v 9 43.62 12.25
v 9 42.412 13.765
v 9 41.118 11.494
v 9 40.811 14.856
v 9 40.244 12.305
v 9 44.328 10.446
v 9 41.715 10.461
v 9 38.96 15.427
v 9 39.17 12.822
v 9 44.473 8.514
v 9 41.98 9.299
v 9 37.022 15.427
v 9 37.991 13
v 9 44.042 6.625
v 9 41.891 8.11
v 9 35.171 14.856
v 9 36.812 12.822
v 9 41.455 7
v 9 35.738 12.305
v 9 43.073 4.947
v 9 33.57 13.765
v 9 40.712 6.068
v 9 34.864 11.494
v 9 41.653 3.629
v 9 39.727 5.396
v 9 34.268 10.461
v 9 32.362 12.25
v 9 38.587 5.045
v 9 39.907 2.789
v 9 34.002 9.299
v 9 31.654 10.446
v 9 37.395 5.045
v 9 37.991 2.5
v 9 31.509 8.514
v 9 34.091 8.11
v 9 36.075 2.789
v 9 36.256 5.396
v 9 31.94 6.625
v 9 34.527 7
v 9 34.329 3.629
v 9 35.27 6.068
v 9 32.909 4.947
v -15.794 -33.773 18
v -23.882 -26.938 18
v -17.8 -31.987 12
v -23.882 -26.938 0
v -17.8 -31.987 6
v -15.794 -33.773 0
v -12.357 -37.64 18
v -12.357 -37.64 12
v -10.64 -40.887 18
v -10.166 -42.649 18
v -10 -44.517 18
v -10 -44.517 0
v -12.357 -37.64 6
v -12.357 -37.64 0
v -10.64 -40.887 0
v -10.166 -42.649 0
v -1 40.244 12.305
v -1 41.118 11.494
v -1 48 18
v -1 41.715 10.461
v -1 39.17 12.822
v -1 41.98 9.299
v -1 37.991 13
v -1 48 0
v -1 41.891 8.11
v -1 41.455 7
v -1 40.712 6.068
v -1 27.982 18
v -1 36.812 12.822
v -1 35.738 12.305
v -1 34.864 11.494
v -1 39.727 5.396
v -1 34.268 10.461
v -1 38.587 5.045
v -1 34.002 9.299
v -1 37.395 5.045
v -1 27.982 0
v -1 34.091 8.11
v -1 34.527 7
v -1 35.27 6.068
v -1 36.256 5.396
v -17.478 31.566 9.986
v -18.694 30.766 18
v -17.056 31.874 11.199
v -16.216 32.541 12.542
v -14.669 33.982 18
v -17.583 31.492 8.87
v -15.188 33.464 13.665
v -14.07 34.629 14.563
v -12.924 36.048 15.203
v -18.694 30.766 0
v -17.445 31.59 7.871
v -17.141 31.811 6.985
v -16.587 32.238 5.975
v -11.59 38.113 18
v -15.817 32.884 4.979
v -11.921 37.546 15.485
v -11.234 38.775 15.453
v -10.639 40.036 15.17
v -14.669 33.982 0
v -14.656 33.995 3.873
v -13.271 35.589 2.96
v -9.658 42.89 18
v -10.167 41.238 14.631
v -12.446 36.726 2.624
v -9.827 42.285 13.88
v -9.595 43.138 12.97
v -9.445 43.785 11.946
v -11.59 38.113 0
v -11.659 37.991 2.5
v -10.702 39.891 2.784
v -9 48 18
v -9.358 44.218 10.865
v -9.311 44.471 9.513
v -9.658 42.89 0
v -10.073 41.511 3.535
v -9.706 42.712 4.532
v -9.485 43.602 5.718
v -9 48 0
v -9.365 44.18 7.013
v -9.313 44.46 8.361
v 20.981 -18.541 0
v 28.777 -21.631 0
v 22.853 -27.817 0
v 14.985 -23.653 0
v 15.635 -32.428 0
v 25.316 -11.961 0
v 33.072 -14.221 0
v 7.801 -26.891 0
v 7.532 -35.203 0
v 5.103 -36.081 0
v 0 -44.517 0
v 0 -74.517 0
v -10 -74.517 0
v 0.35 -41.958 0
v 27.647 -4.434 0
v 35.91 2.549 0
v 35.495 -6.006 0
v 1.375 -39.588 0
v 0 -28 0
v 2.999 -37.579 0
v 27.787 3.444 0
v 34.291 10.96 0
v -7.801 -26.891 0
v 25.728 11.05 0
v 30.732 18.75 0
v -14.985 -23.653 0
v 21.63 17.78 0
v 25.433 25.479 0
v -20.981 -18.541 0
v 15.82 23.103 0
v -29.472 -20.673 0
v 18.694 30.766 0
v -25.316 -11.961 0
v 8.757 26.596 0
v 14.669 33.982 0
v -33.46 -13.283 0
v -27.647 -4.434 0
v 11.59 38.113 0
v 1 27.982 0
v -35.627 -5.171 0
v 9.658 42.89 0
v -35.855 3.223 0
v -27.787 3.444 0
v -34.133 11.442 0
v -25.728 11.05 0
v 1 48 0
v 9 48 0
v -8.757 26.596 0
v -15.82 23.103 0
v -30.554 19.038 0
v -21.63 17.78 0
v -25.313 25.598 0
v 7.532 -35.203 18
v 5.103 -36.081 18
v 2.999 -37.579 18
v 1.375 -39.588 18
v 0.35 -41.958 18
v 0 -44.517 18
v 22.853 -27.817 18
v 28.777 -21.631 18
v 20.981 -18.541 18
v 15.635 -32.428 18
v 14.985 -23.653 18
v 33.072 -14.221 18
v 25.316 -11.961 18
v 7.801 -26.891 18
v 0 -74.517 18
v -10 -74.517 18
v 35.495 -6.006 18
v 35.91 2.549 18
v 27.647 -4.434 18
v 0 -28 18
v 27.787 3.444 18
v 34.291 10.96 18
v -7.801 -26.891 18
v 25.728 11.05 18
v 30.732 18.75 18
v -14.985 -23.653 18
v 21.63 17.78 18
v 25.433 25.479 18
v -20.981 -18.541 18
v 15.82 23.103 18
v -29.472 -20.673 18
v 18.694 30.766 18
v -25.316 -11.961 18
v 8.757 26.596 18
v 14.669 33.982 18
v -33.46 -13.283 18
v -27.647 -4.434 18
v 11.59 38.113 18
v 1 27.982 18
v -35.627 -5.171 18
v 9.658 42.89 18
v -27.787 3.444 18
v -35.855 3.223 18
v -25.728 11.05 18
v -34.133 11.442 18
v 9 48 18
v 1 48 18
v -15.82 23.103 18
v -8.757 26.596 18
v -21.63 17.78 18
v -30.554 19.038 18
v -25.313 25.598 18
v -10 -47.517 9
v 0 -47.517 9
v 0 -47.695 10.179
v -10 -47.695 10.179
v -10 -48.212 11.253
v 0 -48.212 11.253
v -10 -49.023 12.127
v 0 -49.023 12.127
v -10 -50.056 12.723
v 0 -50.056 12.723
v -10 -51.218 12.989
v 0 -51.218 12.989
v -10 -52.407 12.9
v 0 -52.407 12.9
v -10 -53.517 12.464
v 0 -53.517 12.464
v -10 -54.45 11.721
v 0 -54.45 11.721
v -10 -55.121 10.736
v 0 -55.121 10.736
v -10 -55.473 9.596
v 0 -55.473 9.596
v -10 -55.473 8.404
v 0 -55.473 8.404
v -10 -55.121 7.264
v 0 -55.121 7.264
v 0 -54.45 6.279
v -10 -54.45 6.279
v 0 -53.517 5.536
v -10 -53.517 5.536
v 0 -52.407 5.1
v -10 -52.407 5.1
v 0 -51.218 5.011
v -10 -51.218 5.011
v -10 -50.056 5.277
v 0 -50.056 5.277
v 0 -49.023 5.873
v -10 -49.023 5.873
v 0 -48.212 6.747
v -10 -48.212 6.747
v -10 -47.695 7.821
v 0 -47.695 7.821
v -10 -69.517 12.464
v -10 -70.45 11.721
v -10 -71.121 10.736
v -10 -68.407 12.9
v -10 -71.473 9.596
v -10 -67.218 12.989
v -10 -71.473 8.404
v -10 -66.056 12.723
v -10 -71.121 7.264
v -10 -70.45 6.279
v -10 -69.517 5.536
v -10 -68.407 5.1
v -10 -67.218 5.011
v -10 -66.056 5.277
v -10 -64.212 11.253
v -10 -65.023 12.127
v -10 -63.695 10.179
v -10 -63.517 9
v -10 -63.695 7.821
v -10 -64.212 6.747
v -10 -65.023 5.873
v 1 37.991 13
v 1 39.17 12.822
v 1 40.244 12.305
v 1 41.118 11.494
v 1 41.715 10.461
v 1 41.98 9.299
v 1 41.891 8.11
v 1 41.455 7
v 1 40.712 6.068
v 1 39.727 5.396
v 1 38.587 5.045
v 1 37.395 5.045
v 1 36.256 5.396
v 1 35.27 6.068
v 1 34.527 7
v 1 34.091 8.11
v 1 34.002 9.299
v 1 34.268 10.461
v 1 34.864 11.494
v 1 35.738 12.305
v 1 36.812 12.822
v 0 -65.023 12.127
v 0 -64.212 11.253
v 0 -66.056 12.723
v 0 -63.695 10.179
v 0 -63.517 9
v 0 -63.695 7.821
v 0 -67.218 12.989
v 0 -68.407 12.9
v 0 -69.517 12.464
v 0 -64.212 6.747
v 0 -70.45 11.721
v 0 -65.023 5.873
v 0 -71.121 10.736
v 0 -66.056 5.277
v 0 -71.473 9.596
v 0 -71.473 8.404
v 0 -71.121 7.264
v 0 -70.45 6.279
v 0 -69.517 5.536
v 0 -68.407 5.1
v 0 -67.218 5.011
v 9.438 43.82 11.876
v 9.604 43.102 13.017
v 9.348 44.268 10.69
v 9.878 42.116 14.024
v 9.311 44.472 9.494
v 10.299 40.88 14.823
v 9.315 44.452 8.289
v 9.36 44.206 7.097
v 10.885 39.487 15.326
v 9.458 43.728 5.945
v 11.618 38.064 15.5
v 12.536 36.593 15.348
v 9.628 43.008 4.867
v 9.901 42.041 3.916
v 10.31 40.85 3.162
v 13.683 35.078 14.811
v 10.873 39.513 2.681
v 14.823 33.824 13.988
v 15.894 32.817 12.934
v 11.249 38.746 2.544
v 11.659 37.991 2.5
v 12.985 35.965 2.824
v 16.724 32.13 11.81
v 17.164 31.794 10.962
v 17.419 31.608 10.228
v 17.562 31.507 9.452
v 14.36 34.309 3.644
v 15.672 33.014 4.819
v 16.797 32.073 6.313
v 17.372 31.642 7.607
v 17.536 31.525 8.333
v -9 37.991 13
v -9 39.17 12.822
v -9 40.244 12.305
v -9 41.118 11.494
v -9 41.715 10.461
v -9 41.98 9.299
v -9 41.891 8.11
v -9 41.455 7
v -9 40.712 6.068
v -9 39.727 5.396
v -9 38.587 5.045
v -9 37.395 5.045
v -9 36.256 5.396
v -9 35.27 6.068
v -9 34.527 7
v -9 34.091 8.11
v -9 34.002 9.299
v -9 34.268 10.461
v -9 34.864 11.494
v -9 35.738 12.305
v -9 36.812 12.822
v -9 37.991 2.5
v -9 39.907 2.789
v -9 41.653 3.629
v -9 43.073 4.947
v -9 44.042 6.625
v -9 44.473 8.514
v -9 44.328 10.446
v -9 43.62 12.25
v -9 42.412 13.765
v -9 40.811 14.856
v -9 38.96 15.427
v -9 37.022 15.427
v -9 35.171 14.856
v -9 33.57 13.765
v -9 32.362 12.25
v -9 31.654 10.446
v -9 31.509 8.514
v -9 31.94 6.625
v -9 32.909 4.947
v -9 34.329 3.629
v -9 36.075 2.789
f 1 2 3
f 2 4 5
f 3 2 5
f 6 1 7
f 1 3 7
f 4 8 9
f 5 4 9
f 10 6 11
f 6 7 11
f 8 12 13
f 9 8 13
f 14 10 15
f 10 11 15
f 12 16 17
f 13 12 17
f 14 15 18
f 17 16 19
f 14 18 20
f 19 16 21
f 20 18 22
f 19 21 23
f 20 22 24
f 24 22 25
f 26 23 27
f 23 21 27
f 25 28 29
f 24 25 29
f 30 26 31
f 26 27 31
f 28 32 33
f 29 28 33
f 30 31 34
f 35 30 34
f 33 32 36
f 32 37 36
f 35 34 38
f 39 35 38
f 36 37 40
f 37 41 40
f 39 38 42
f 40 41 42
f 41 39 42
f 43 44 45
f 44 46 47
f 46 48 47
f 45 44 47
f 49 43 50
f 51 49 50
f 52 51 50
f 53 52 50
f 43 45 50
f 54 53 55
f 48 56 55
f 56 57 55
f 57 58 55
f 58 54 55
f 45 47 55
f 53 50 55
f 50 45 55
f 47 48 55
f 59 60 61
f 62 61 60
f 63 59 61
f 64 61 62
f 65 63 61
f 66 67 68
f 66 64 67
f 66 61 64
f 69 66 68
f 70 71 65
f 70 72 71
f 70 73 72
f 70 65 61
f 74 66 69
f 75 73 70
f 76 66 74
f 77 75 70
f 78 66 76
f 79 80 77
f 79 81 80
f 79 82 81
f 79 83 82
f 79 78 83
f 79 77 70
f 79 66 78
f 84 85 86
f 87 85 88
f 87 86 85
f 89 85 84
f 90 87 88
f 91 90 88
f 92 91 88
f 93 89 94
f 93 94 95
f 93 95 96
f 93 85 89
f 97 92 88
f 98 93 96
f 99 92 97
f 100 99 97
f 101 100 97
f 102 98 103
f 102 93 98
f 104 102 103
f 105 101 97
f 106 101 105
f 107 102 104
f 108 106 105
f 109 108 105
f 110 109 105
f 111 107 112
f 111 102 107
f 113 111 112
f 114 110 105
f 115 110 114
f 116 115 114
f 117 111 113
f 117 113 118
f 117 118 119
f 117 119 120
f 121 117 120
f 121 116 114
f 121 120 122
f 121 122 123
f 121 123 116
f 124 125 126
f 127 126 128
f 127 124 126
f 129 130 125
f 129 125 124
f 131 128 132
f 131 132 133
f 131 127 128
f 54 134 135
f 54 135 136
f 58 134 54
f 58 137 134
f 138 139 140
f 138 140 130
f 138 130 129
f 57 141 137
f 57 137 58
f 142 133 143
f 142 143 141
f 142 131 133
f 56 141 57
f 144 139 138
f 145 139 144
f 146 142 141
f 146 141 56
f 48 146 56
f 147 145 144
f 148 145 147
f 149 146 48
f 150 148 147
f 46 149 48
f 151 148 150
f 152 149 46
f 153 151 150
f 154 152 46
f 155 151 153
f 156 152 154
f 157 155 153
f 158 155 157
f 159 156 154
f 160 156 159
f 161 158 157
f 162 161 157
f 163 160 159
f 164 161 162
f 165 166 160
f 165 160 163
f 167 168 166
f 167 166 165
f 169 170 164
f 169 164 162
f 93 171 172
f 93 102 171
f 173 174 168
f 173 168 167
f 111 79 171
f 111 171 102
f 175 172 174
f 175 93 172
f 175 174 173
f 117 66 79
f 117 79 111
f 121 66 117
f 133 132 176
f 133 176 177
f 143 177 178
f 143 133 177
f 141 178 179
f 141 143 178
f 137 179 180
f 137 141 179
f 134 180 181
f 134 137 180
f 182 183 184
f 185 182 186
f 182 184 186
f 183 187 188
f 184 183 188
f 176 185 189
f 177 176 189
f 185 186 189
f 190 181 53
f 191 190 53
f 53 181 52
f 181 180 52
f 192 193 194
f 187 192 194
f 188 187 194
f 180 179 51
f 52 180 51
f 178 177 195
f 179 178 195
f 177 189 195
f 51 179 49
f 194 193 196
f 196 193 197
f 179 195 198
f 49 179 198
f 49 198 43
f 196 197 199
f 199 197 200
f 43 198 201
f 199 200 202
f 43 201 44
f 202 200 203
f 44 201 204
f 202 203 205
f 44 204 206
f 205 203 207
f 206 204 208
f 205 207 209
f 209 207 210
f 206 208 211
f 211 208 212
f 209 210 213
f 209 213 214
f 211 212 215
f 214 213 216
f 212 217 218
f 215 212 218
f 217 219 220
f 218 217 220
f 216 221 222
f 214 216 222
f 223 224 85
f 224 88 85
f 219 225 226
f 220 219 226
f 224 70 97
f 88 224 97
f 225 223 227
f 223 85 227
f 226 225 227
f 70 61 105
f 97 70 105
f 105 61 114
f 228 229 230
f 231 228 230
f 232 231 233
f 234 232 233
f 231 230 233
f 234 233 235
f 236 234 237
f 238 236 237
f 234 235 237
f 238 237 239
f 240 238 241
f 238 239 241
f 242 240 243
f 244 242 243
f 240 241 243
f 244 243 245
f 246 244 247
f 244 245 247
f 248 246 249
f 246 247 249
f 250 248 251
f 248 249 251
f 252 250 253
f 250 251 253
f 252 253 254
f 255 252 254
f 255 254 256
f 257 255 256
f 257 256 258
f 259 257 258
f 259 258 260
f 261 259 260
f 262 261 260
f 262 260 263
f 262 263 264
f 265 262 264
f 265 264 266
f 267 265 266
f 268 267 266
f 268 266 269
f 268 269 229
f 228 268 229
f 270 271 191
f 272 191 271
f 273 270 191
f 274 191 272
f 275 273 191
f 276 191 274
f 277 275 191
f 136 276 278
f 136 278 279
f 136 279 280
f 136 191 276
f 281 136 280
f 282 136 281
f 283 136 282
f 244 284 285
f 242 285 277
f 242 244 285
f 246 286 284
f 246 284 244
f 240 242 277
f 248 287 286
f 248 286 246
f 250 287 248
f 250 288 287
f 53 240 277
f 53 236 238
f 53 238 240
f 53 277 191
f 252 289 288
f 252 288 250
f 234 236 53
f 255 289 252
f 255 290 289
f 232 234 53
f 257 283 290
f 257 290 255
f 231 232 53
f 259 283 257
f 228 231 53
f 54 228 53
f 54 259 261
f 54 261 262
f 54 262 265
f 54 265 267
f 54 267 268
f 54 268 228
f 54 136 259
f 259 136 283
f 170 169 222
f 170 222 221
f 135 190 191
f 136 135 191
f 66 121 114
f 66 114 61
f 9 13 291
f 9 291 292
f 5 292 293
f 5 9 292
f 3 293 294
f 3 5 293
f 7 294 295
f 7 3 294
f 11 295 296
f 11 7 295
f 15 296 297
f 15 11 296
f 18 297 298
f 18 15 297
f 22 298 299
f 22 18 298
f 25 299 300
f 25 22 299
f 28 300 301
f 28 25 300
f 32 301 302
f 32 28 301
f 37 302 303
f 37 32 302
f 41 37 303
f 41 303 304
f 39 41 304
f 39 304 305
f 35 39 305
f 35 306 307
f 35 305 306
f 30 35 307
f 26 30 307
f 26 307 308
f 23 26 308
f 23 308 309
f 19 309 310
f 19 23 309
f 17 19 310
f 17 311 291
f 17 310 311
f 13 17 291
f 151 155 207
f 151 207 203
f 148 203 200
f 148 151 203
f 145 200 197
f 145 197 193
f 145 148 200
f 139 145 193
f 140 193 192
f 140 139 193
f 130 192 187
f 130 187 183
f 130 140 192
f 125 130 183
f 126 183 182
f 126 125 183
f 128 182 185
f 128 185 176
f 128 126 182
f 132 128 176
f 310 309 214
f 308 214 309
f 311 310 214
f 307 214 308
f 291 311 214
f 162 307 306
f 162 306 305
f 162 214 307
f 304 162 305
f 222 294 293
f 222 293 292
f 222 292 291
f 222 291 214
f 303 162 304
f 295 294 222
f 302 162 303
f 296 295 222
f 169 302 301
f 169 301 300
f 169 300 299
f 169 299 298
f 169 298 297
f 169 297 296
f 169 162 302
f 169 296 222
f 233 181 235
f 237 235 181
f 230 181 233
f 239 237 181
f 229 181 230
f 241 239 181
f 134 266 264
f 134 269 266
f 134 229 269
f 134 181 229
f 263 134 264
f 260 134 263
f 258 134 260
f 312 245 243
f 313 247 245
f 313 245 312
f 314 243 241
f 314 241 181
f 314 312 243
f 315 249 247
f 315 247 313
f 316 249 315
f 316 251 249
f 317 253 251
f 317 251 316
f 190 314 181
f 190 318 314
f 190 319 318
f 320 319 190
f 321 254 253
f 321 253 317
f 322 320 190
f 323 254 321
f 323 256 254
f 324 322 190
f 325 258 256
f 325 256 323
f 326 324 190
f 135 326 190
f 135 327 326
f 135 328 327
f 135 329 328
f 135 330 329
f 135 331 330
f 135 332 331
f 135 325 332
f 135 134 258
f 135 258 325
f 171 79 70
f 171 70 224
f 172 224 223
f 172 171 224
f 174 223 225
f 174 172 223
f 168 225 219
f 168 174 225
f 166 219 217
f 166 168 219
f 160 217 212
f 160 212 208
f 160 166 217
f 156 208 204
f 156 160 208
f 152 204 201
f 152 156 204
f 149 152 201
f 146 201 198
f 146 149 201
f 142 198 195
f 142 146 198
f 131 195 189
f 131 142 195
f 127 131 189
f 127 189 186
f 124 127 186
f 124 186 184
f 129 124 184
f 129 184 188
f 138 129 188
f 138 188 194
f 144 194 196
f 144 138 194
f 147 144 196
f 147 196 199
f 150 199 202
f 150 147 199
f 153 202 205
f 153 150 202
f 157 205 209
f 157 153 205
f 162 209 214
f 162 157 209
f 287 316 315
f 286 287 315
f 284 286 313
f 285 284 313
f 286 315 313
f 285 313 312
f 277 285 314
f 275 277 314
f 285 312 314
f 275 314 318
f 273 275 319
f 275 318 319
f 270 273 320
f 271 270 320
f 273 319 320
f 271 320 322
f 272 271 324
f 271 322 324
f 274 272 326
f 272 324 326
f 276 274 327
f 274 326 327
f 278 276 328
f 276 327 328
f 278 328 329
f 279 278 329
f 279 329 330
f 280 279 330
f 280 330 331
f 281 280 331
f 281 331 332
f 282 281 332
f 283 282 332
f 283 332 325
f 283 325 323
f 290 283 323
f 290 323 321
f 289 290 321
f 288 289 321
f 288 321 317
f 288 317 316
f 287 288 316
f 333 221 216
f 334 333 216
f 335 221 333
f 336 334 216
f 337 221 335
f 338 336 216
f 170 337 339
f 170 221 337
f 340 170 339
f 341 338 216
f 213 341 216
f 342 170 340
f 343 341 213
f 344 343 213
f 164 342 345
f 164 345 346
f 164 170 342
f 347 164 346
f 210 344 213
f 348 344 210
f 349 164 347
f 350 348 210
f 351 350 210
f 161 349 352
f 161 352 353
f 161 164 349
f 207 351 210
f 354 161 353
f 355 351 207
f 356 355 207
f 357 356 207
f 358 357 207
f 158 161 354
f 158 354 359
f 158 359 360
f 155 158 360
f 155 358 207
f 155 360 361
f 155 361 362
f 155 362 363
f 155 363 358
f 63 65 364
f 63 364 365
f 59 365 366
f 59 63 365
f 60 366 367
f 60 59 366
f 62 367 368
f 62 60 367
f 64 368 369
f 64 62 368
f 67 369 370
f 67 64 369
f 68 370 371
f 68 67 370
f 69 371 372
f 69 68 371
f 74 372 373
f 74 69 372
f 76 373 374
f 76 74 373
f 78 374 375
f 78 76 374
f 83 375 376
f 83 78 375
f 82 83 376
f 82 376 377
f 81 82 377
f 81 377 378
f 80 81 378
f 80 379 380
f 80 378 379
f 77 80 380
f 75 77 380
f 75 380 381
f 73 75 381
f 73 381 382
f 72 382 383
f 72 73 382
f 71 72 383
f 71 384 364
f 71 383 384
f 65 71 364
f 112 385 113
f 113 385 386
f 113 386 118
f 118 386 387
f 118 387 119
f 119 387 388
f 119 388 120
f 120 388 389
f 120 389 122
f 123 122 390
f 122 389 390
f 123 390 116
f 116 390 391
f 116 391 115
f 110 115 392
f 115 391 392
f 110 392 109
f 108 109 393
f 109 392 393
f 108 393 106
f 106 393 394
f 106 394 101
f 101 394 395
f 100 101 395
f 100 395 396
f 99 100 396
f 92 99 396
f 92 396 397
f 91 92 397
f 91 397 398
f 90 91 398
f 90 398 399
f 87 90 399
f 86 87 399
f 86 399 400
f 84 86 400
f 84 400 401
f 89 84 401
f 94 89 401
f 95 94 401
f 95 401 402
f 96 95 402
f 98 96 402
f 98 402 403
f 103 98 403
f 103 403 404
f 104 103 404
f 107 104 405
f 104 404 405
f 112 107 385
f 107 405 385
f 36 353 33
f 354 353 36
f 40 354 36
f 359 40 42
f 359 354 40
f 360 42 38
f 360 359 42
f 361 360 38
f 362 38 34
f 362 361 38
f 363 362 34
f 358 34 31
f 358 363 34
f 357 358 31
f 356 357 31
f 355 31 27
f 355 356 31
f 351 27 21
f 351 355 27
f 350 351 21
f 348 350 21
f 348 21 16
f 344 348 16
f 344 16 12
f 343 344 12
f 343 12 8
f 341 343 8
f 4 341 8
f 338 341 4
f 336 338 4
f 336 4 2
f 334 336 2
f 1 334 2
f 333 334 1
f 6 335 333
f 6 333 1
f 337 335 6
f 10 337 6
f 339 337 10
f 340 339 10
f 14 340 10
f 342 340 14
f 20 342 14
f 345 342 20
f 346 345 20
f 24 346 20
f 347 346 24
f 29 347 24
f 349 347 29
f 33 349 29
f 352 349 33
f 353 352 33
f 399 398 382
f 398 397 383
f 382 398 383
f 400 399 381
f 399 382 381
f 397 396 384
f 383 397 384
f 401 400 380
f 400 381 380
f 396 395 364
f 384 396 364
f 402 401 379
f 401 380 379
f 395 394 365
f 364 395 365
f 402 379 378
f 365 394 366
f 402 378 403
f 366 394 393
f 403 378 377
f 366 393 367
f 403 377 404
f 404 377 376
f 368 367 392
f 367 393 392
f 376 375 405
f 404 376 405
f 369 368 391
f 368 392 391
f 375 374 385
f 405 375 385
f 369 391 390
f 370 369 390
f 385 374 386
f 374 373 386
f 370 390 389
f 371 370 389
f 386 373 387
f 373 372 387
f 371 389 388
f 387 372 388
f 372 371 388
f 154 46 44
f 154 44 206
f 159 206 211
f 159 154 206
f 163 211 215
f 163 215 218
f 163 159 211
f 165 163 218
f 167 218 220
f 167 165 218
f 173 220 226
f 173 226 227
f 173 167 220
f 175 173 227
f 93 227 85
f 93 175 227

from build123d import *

# Parameters (mm, degrees)
BOSS_EXTRUDE1_DEPTH     = 18
CUT_EXTRUDE4_DEPTH      = 86.122527954
CUT_EXTRUDE4_DEPTH_BACK = 86.122527954
SKETCH7_R               = 4
SKETCH8_R               = 6.5
CUT_EXTRUDE5_DEPTH      = 18
CUT_EXTRUDE6_START      = -18
SKETCH10_R              = 6.5
CUT_EXTRUDE6_DEPTH      = 18
SKETCH12_R              = 4
CUT_EXTRUDE7_DEPTH      = 85.692648826


with BuildPart() as part:
    # Sketch1 → Boss-Extrude1 (new body)
    with BuildSketch(Plane.XY):
        with BuildLine():
            Line((0, -44.517412324), (0, -74.517412324))
            Line((0, -74.517412324), (-10, -74.517412324))
            Line((-10, -74.517412324), (-10, -44.517412324))
            add(Edge.make_bspline(
                [(-23.881707028, -26.938152673), (-18.294689626, -31.891258195), (-10, -36.821023575), (-10, -44.517412324)],
                knots=[0, 0, 0, 0, 1, 1, 1, 1], degree=3))
            ThreePointArc((-23.881707028, -26.938152673), (-35.855411942, 3.223264562), (-18.694362018, 30.765578635))
            ThreePointArc((-18.694362018, 30.765578635), (-11.589893335, 38.113065001), (-9, 48))
            Line((-9, 48), (-1, 48))
            Line((-1, 48), (-1, 27.982137159))
            ThreePointArc((-1, 27.982137159), (0, -28), (1, 27.982137159))
            Line((1, 27.982137159), (1, 48))
            Line((1, 48), (9, 48))
            ThreePointArc((9, 48), (11.589893335, 38.113065001), (18.694362018, 30.765578635))
            ThreePointArc((18.694362018, 30.765578635), (35.495463651, -6.006002016), (7.532125206, -35.203225561))
            ThreePointArc((7.532125206, -35.203225561), (2.11865956, -38.528109669), (0, -44.517412324))
        make_face()
    extrude(amount=BOSS_EXTRUDE1_DEPTH)

    # Sketch7 → Cut-Extrude4 (cut, two sides: drawn at the far end of the back side and taken through both)
    with BuildSketch(Plane.ZY.offset(-1).offset(-CUT_EXTRUDE4_DEPTH_BACK)):
        with Locations((9, 37.99106858)):
            Circle(SKETCH7_R)
    extrude(amount=CUT_EXTRUDE4_DEPTH + CUT_EXTRUDE4_DEPTH_BACK, mode=Mode.SUBTRACT)

    # Sketch8 → Cut-Extrude5 (cut)
    with BuildSketch(Plane(origin=(-9, 0, 0), x_dir=(0, 0, -1), z_dir=(1, 0, 0))):
        with Locations((-9, 37.99106858)):
            Circle(SKETCH8_R)
    extrude(amount=-CUT_EXTRUDE5_DEPTH, mode=Mode.SUBTRACT)

    # Sketch10 → Cut-Extrude6 (cut)
    with BuildSketch(Plane.ZY.offset(-9).offset(CUT_EXTRUDE6_START)):
        with Locations(Location((9, 37.99106858, 0), (0, 0, 180))):
            Circle(SKETCH10_R)
    extrude(amount=CUT_EXTRUDE6_DEPTH, mode=Mode.SUBTRACT)

    # Sketch12 → Cut-Extrude7 (cut, through all)
    with BuildSketch(Plane(origin=(0, 0, 0), x_dir=(0, 0, -1), z_dir=(1, 0, 0))):
        with Locations(Location((-9, -51.517412324, 0), (0, 0, 90))):
            Circle(SKETCH12_R)
        with Locations(Location((-9, -67.517412324, 0), (0, 0, 90))):
            Circle(SKETCH12_R)
    extrude(amount=-CUT_EXTRUDE7_DEPTH, mode=Mode.SUBTRACT)


solid = part.part
